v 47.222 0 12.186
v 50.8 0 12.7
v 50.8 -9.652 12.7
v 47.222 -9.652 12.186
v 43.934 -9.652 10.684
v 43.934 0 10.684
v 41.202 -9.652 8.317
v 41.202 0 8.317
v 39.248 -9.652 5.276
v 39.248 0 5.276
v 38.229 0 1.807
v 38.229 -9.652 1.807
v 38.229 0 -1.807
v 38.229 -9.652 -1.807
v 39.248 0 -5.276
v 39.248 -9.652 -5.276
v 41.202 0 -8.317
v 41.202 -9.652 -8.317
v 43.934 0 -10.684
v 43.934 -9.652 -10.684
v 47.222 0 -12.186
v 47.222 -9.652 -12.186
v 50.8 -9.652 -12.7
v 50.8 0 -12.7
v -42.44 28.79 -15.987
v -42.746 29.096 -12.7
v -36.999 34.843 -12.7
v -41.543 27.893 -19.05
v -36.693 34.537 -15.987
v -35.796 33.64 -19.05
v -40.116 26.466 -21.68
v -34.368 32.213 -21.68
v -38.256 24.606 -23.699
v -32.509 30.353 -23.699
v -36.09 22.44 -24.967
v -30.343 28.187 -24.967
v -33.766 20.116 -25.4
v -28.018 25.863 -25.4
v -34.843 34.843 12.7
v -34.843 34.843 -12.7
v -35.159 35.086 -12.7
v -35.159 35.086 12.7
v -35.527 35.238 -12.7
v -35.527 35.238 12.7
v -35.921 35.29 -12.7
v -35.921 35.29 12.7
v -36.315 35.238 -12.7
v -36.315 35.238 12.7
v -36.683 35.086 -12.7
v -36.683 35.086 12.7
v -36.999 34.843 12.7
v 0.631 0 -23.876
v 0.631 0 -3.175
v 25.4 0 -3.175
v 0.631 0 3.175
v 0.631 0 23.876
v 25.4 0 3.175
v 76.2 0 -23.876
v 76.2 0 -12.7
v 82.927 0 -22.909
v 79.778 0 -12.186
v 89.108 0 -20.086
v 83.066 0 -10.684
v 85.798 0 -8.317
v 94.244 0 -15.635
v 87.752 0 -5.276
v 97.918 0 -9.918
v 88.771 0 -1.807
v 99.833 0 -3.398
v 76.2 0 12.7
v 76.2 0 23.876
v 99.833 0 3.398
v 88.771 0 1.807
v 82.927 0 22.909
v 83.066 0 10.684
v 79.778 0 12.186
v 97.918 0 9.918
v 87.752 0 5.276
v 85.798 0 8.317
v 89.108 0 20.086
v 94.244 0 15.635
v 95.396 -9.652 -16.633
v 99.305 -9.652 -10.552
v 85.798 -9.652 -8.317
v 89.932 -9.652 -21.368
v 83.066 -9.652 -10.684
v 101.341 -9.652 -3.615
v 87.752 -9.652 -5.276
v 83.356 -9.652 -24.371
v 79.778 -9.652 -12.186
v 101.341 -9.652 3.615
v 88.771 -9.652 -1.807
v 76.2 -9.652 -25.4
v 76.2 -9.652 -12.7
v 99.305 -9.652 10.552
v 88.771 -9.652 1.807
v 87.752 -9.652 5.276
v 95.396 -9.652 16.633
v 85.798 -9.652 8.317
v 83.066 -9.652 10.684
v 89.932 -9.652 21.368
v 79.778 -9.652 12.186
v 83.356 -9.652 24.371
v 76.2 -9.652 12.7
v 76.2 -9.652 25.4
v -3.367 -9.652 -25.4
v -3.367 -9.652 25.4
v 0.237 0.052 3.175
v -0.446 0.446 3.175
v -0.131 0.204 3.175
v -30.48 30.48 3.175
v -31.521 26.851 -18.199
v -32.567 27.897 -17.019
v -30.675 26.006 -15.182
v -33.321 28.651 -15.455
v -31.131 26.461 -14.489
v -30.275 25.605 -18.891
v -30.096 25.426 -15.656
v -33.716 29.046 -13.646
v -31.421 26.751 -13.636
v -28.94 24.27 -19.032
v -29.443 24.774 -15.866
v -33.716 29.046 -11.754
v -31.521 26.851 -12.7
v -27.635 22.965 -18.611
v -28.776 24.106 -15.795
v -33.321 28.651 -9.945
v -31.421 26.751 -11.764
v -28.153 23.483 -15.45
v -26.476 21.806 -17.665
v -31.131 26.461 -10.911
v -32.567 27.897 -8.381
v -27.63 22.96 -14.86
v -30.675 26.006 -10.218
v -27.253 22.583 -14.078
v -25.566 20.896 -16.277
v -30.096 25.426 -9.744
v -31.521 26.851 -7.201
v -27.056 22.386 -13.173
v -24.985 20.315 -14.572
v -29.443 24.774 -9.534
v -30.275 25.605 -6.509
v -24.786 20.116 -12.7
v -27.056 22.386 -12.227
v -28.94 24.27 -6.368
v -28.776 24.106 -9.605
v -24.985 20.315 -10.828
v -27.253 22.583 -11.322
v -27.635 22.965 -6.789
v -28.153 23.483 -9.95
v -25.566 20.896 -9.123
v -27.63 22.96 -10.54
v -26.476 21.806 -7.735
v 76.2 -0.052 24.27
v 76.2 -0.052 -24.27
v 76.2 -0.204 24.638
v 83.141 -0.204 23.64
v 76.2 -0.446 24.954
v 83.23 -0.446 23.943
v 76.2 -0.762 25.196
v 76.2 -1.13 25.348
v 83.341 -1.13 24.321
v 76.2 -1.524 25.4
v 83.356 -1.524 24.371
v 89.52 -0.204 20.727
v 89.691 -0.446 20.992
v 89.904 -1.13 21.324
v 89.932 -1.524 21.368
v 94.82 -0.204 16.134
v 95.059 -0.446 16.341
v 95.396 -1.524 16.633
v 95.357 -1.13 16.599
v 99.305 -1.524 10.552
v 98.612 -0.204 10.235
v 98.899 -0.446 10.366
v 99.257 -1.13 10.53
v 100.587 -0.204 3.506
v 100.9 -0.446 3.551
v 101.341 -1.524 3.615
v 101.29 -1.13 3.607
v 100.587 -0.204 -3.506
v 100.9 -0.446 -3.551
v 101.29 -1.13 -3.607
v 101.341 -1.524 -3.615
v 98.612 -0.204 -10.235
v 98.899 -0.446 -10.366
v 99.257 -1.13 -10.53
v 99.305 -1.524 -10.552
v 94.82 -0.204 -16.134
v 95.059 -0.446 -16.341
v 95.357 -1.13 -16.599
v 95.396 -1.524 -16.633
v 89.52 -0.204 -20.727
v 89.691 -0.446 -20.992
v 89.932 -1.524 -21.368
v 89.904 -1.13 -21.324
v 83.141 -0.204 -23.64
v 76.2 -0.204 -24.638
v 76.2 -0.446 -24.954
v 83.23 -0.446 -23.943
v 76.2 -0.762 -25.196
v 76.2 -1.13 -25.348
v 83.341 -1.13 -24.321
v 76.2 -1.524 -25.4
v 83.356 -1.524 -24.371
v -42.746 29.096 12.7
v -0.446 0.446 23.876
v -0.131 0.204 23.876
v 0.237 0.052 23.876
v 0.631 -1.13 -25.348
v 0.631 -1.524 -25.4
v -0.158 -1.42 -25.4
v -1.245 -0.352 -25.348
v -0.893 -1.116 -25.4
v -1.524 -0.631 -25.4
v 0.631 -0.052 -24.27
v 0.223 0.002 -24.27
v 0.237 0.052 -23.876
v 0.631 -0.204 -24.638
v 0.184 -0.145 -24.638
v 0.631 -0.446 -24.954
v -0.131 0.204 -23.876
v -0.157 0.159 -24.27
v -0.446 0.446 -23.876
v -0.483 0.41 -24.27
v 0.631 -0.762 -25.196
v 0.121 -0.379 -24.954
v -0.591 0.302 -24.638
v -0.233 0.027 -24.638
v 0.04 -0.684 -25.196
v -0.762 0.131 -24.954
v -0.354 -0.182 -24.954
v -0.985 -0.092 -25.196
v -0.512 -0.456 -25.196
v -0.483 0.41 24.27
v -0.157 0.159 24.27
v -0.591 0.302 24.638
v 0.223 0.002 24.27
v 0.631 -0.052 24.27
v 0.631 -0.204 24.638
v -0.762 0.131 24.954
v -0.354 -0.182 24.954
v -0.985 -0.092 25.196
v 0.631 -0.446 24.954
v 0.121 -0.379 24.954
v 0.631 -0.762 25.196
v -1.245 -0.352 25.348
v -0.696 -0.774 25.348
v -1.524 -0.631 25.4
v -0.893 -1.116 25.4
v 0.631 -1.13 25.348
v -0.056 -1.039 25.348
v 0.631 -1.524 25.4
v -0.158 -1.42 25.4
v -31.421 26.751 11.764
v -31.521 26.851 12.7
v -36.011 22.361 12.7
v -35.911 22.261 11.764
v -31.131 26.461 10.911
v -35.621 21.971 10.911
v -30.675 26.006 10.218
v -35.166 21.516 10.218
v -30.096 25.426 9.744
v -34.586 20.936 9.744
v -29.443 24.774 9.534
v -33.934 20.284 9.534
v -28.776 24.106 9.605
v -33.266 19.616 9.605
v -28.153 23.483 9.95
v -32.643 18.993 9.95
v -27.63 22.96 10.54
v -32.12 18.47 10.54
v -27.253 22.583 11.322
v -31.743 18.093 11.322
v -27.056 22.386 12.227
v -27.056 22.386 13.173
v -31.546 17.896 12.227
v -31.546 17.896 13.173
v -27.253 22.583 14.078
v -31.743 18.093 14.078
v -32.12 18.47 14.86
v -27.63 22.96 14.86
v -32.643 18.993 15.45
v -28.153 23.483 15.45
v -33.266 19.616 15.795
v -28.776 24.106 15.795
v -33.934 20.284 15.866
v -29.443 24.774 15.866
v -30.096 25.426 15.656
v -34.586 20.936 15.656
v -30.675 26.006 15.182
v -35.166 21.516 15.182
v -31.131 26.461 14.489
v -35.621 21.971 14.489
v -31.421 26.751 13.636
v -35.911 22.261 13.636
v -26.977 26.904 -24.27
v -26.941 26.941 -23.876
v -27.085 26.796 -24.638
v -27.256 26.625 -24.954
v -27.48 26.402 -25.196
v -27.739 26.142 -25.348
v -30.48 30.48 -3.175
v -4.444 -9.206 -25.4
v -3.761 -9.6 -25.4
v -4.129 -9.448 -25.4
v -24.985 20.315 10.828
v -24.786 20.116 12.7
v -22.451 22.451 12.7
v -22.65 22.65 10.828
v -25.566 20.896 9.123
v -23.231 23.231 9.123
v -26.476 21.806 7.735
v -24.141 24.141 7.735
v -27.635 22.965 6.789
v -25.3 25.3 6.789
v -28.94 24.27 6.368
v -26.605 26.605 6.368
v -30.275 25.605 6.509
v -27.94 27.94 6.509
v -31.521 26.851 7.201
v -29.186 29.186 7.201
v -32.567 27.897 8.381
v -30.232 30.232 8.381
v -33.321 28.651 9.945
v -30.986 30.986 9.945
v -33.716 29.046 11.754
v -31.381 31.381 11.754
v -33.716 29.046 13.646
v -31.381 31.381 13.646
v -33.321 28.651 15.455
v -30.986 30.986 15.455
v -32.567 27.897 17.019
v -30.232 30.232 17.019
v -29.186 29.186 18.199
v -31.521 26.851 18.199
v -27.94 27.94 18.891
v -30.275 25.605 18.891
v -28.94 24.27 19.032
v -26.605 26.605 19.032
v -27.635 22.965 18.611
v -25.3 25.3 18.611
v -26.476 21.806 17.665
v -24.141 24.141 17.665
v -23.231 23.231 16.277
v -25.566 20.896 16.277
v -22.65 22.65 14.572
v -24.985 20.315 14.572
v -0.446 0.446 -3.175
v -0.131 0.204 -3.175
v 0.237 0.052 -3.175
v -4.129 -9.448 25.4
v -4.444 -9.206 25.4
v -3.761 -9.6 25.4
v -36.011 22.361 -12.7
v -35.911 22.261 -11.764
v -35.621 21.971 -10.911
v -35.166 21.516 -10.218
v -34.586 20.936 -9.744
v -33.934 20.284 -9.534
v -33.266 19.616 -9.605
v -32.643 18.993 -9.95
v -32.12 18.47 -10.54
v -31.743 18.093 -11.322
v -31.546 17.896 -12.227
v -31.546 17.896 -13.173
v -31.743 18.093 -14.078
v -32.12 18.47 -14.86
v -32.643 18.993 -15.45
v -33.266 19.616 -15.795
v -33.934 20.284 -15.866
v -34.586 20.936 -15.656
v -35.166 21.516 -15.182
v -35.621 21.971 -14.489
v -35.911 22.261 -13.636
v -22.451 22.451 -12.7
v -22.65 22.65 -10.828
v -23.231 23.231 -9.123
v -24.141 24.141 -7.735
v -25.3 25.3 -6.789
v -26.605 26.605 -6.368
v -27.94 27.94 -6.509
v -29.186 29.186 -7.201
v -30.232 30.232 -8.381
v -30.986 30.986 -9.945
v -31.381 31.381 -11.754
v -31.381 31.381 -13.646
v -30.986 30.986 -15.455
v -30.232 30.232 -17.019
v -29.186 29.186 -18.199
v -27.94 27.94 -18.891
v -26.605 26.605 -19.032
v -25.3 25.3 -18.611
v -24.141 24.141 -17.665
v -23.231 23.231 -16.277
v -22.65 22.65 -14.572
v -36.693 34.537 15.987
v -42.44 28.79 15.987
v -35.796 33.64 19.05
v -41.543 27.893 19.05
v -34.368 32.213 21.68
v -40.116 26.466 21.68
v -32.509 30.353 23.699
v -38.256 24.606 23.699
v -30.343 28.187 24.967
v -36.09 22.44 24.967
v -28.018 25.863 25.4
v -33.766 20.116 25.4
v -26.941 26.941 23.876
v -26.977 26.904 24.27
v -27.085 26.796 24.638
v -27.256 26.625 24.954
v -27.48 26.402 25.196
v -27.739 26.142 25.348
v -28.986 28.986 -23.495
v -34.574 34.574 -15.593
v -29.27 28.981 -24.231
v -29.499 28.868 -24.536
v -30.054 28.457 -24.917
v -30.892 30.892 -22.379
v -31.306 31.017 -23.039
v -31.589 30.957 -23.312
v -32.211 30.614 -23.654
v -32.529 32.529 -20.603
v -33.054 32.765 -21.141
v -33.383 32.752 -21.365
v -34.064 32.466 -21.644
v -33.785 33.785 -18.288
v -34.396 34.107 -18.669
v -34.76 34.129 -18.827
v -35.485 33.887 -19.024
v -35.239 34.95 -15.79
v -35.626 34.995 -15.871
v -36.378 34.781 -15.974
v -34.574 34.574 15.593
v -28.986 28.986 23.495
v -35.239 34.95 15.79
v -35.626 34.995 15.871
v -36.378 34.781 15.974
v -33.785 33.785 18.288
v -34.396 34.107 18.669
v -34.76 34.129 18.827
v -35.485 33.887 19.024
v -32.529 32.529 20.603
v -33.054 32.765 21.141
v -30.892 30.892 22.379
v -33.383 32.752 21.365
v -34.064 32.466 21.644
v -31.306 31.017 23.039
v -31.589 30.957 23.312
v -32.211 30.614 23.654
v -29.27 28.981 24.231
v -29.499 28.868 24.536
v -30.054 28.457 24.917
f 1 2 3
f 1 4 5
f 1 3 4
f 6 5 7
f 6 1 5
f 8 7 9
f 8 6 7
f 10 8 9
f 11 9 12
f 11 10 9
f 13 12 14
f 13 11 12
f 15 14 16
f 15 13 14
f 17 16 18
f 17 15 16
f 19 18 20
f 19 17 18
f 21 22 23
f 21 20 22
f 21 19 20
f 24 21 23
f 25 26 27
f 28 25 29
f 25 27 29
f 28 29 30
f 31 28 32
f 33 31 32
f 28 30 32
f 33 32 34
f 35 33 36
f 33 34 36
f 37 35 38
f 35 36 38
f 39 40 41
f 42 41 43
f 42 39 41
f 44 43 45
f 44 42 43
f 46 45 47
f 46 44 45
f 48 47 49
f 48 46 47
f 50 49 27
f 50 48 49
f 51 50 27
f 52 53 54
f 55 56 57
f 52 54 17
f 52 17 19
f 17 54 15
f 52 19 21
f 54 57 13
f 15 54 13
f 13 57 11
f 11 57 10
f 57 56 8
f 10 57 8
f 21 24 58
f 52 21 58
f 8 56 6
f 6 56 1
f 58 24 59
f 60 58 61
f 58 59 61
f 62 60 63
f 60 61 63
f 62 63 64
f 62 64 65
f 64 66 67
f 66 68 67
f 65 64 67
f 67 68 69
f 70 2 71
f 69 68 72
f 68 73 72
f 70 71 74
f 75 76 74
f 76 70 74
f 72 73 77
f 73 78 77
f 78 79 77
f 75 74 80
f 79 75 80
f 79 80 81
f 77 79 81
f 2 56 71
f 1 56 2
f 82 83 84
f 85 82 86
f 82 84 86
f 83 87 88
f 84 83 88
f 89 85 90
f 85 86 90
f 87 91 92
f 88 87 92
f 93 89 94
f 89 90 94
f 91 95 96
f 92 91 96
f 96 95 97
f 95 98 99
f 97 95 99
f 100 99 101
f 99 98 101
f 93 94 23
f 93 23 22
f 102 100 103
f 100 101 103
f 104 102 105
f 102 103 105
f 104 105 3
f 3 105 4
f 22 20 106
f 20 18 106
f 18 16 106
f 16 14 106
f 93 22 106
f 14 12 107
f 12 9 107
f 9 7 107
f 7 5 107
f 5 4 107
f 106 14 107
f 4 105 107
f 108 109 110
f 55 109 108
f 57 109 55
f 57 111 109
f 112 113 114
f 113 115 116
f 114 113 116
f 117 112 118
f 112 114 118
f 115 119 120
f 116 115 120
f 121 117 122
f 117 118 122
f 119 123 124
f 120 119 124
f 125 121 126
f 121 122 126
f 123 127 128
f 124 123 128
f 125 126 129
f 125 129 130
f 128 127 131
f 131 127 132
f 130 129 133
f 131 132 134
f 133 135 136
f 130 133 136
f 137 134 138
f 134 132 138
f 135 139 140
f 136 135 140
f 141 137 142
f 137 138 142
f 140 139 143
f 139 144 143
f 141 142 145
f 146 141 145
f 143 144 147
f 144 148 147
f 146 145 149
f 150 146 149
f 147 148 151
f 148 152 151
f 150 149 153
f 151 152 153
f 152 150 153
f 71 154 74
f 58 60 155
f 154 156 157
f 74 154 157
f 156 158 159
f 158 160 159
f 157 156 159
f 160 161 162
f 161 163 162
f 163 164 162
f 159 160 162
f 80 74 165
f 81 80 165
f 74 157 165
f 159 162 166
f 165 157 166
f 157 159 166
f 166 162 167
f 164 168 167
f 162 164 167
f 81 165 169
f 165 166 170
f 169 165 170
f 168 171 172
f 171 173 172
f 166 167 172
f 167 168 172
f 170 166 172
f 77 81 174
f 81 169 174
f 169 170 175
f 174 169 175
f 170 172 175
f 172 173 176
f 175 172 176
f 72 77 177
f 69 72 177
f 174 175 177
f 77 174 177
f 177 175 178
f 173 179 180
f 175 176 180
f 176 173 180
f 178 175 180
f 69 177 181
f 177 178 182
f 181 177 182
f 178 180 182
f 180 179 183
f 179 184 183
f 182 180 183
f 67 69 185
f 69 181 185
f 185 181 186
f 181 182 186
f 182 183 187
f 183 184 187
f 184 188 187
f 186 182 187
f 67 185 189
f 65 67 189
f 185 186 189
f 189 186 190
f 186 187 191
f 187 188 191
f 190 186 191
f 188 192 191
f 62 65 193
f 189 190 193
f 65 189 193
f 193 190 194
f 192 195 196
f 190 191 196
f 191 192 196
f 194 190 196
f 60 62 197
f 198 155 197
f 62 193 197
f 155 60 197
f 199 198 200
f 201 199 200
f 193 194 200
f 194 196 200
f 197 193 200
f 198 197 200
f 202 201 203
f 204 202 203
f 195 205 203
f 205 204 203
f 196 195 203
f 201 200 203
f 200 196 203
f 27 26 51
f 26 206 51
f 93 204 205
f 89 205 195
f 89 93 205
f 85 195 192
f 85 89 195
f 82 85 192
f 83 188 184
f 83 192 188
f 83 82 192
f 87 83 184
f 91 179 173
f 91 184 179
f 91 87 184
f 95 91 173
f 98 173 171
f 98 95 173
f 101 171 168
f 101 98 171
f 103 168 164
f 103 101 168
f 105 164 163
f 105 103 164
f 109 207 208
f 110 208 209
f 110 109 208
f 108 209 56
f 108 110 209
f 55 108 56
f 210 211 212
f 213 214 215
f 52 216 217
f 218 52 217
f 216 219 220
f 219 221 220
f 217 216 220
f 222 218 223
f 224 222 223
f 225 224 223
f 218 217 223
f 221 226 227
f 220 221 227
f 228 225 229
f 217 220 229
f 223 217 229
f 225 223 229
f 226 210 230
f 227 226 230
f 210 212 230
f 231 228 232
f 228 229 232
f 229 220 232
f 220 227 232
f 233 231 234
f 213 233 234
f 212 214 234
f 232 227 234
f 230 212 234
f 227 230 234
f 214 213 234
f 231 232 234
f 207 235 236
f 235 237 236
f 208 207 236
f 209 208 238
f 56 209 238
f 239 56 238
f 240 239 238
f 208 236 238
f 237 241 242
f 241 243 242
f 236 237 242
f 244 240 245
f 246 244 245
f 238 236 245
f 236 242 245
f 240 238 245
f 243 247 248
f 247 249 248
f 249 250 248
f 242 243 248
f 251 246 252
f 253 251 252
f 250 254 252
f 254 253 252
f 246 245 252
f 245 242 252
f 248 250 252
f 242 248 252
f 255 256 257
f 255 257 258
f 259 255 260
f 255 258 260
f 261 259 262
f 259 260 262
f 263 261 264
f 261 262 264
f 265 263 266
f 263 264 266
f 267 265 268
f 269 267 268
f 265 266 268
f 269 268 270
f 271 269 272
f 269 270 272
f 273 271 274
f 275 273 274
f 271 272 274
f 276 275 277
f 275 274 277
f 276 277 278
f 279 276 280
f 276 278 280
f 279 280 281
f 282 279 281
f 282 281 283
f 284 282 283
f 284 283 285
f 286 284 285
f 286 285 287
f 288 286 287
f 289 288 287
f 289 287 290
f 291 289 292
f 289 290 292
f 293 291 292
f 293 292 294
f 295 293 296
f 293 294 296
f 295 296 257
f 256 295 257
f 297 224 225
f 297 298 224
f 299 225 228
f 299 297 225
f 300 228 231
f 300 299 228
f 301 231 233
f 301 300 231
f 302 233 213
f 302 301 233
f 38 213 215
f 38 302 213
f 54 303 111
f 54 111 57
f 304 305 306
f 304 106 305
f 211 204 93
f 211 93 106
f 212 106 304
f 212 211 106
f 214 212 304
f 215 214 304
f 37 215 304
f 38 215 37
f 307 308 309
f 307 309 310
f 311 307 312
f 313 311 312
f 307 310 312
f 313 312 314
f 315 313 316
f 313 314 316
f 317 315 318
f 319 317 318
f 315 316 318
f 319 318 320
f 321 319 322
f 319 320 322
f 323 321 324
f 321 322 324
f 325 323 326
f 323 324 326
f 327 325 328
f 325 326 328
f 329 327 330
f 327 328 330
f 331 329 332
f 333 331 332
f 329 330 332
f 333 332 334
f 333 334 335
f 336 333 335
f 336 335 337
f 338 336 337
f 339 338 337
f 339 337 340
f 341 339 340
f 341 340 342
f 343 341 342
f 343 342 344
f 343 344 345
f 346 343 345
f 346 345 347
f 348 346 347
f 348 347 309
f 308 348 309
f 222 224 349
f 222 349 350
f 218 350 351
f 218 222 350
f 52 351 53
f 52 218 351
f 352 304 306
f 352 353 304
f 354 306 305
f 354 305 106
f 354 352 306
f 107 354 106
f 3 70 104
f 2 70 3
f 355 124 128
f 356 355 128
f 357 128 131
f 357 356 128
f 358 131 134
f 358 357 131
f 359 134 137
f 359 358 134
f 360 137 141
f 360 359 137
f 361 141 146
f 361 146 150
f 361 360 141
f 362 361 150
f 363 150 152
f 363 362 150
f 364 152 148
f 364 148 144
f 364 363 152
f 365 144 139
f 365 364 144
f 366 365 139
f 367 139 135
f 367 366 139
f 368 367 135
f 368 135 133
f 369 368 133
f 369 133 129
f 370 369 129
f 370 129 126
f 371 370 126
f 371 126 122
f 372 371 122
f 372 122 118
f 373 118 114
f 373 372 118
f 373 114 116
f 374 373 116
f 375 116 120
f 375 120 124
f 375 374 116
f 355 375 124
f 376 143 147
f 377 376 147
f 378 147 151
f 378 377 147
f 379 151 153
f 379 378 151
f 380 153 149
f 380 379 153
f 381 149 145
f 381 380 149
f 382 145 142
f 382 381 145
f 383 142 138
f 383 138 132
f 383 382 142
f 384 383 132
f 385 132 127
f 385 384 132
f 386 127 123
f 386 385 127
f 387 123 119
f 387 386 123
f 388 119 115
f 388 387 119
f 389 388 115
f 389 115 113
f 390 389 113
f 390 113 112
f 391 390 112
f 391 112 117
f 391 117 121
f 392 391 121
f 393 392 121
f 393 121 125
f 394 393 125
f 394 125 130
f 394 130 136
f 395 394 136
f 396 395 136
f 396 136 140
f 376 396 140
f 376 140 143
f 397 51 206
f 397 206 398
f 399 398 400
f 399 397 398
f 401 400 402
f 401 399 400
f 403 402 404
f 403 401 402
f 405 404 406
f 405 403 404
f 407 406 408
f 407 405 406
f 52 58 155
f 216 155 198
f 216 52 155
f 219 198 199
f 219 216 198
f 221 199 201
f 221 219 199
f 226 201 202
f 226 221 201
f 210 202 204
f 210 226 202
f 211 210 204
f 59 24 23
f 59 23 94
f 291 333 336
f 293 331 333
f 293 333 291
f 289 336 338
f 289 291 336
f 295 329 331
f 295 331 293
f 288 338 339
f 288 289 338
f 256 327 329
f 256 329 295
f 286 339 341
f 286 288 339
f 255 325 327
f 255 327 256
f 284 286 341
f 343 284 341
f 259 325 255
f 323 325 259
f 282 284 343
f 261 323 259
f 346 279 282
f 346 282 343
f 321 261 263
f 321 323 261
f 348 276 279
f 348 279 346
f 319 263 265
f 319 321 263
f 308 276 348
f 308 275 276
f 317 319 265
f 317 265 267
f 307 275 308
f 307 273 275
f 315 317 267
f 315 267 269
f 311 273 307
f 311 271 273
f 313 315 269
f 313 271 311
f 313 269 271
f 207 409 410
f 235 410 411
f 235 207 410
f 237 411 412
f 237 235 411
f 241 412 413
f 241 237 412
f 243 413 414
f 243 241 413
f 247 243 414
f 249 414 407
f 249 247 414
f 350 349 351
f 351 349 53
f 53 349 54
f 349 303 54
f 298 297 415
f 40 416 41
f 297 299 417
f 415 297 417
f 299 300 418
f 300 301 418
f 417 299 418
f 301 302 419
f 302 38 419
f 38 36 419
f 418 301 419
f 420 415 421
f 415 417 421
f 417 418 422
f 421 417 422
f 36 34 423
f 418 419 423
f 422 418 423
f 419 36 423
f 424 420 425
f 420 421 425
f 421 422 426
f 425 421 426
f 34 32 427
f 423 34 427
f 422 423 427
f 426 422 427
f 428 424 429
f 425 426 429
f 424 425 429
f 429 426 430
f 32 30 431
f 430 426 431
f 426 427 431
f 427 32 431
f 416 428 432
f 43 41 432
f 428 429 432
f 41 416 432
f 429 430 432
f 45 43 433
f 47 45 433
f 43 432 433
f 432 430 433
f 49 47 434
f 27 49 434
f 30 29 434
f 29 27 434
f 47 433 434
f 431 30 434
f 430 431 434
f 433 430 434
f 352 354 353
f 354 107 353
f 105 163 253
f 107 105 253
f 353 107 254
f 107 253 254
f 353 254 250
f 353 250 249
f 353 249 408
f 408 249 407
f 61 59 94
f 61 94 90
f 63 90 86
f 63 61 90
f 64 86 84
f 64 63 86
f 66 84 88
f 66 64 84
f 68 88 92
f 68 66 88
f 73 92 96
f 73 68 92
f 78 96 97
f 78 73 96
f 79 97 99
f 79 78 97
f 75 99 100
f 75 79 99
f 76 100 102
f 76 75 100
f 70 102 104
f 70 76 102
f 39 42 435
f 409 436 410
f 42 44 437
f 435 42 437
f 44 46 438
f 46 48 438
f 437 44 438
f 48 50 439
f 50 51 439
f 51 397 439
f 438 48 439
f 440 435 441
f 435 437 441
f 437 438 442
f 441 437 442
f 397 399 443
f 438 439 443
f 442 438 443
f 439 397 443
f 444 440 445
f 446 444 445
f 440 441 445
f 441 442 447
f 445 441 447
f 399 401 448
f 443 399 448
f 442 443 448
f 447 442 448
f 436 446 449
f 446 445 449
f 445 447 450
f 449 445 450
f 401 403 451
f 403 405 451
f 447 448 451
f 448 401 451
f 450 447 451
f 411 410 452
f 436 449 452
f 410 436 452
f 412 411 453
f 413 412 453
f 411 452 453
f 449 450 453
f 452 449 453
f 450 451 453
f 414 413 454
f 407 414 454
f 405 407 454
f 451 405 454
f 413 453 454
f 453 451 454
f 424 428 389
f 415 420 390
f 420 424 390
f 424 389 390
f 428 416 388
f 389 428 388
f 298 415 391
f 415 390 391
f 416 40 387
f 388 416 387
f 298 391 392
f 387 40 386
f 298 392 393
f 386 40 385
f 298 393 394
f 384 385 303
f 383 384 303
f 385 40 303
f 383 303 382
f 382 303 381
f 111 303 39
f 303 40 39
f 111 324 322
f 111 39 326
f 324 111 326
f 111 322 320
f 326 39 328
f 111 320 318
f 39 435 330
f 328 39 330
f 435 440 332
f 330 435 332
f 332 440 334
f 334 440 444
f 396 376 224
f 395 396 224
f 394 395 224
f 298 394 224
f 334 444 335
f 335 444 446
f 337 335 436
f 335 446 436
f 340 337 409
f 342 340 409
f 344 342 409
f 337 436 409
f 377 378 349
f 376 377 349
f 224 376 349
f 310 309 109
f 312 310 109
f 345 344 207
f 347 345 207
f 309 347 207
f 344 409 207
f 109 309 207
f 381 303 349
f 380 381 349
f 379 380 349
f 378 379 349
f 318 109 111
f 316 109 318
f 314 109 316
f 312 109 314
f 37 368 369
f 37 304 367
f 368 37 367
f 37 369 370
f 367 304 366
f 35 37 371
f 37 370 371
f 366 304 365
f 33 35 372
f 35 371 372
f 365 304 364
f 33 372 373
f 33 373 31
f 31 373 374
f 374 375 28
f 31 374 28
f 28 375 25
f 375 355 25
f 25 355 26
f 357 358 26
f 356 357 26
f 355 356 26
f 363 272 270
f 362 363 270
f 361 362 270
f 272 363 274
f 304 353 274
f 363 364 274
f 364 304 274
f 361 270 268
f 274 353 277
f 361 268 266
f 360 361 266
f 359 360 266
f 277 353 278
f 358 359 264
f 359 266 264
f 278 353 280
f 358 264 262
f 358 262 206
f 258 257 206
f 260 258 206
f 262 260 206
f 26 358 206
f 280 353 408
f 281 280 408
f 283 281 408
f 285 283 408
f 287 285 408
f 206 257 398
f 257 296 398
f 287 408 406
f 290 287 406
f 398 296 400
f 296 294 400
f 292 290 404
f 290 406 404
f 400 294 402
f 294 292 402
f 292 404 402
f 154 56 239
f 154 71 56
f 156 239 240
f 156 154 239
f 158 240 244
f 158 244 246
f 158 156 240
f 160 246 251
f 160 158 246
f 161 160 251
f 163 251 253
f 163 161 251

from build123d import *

# Parameters (mm, degrees)
EXTRUDE_THIN1_DEPTH                                 = 25.4
CUT_EXTRUDE1_DEPTH                                  = 111.716033166
CBORE_FOR_00_BINDING_HEAD_MACHINE_SCREW_D           = 6.35
CBORE_FOR_00_BINDING_HEAD_MACHINE_SCREW_CBORE_D     = 12.7
CBORE_FOR_00_BINDING_HEAD_MACHINE_SCREW_CBORE_DEPTH = 3.302
RIB1_REACH                                          = 112.716
SKETCH6_WALL_W                                      = 287.08428389
SKETCH6_WALL_H                                      = 6.35
FILLET1_R                                           = 12.7
FILLET2_R                                           = 1.524
FILLET3_RADIUS                                      = 25.4
FILLET3_LENGTH                                      = 9.652
FILLET4_R                                           = 1.524


with BuildPart() as part:
    # Sketch2 → Extrude-Thin1 (new, symmetric)
    with BuildSketch(Plane.XY):
        Polygon((-35.921024484, 35.921024484), (0, 0), (101.6, 0), (101.6, -9.652), (-3.997989304, -9.652), (-42.746019136, 29.096029832), align=None)
    extrude(amount=EXTRUDE_THIN1_DEPTH, both=True)

    # Sketch3 → Cut-Extrude1 (cut, through all)
    with BuildSketch(Plane(origin=(0, 0, 0), x_dir=(1, 0, 0), z_dir=(0, 1, 0))):
        with BuildLine():
            Line((50.8, 12.7), (76.2, 12.7))
            ThreePointArc((76.2, 12.7), (88.9, 0), (76.2, -12.7))
            Line((76.2, -12.7), (50.8, -12.7))
            ThreePointArc((50.8, -12.7), (38.1, 0), (50.8, 12.7))
        make_face()
    extrude(amount=-CUT_EXTRUDE1_DEPTH, mode=Mode.SUBTRACT)

    # CBORE for #00 Binding Head Machine Screw1 (through all)
    with Locations(Plane(origin=(0, 0, 0), x_dir=(0.7071067811865513, -0.7071067811865438, 0), z_dir=(0.7071067811865438, 0.7071067811865513, 0))):
        with Locations((-38.1, -12.7)):
            cbore_for_00_binding_head_machine_screw = CounterBoreHole(CBORE_FOR_00_BINDING_HEAD_MACHINE_SCREW_D / 2, CBORE_FOR_00_BINDING_HEAD_MACHINE_SCREW_CBORE_D / 2, CBORE_FOR_00_BINDING_HEAD_MACHINE_SCREW_CBORE_DEPTH)

    # Mirror1: CBORE for #00 Binding Head Machine Screw1 across plane
    add(cbore_for_00_binding_head_machine_screw.mirror(Plane.XY), mode=Mode.SUBTRACT)

    # Sketch6 wall → Rib1 (add, up to next)
    with BuildSketch(Plane(origin=(-2.54, 15.24, 0), x_dir=(0.877895572914, -0.478852130681, 0), z_dir=(0.478852130681, 0.877895572914, 0)), mode=Mode.PRIVATE) as rib1_sk1:
        Rectangle(SKETCH6_WALL_W, SKETCH6_WALL_H)
    rib1_tool1 = extrude(rib1_sk1.sketch, amount=-RIB1_REACH, mode=Mode.PRIVATE) - part.part
    add(rib1_tool1.solids().sort_by_distance((-2.54, 15.24, 0))[0])

    # Fillet1
    fillet1_edges = [part.edges().sort_by_distance(p)[0] for p in [
        (-39.33352181, 32.508527158, -25.4),
        (-39.33352181, 32.508527158, 25.4),
    ]]
    fillet(fillet1_edges, radius=FILLET1_R)

    # Fillet2
    fillet2_edges = [part.edges().sort_by_distance(p)[0] for p in [
        (0, 0, -14.2875),
        (0, 0, 14.2875),
        (-3.997989304, -9.652, 0),
    ]]
    fillet(fillet2_edges, radius=FILLET2_R)

    # Fillet3: full round fillet: the end face becomes a half cylinder, R = half its width
    fillet3_face = Plane((101.6, -4.826, 0), x_dir=(0, -1, 0), z_dir=(1, 0, 0))  # on the end face: x along it, z out of the body
    fillet3_slab = fillet3_face.offset(-FILLET3_RADIUS / 2) * Box(FILLET3_LENGTH, 2 * FILLET3_RADIUS, FILLET3_RADIUS, mode=Mode.PRIVATE)  # the body's end, R deep
    fillet3_round = Plane((76.2, -4.826, 0), x_dir=(1, 0, 0), z_dir=(0, -1, 0)) * Cylinder(FILLET3_RADIUS, FILLET3_LENGTH, mode=Mode.PRIVATE)  # its axis R under the face
    add(fillet3_slab - fillet3_round, mode=Mode.SUBTRACT)

    # Fillet4
    fillet4_edges = [part.edges().sort_by_distance(p)[0] for p in [
        (38.415630735, 0, 25.4),
        (38.415630735, 0, -25.4),
        (101.6, 0, 0),
        (-35.921024484, 35.921024484, 0),
        (-33.290768363, 33.290768363, 21.680256121),
        (-33.290768363, 33.290768363, -21.680256121),
        (-13.693568814, 13.693568814, -25.4),
        (-13.693568814, 13.693568814, 25.4),
        (0.048051918, 0.116007592, -25.4),
        (0.048051918, 0.116007592, 25.4),
    ]]
    fillet(fillet4_edges, radius=FILLET4_R)


solid = part.part
